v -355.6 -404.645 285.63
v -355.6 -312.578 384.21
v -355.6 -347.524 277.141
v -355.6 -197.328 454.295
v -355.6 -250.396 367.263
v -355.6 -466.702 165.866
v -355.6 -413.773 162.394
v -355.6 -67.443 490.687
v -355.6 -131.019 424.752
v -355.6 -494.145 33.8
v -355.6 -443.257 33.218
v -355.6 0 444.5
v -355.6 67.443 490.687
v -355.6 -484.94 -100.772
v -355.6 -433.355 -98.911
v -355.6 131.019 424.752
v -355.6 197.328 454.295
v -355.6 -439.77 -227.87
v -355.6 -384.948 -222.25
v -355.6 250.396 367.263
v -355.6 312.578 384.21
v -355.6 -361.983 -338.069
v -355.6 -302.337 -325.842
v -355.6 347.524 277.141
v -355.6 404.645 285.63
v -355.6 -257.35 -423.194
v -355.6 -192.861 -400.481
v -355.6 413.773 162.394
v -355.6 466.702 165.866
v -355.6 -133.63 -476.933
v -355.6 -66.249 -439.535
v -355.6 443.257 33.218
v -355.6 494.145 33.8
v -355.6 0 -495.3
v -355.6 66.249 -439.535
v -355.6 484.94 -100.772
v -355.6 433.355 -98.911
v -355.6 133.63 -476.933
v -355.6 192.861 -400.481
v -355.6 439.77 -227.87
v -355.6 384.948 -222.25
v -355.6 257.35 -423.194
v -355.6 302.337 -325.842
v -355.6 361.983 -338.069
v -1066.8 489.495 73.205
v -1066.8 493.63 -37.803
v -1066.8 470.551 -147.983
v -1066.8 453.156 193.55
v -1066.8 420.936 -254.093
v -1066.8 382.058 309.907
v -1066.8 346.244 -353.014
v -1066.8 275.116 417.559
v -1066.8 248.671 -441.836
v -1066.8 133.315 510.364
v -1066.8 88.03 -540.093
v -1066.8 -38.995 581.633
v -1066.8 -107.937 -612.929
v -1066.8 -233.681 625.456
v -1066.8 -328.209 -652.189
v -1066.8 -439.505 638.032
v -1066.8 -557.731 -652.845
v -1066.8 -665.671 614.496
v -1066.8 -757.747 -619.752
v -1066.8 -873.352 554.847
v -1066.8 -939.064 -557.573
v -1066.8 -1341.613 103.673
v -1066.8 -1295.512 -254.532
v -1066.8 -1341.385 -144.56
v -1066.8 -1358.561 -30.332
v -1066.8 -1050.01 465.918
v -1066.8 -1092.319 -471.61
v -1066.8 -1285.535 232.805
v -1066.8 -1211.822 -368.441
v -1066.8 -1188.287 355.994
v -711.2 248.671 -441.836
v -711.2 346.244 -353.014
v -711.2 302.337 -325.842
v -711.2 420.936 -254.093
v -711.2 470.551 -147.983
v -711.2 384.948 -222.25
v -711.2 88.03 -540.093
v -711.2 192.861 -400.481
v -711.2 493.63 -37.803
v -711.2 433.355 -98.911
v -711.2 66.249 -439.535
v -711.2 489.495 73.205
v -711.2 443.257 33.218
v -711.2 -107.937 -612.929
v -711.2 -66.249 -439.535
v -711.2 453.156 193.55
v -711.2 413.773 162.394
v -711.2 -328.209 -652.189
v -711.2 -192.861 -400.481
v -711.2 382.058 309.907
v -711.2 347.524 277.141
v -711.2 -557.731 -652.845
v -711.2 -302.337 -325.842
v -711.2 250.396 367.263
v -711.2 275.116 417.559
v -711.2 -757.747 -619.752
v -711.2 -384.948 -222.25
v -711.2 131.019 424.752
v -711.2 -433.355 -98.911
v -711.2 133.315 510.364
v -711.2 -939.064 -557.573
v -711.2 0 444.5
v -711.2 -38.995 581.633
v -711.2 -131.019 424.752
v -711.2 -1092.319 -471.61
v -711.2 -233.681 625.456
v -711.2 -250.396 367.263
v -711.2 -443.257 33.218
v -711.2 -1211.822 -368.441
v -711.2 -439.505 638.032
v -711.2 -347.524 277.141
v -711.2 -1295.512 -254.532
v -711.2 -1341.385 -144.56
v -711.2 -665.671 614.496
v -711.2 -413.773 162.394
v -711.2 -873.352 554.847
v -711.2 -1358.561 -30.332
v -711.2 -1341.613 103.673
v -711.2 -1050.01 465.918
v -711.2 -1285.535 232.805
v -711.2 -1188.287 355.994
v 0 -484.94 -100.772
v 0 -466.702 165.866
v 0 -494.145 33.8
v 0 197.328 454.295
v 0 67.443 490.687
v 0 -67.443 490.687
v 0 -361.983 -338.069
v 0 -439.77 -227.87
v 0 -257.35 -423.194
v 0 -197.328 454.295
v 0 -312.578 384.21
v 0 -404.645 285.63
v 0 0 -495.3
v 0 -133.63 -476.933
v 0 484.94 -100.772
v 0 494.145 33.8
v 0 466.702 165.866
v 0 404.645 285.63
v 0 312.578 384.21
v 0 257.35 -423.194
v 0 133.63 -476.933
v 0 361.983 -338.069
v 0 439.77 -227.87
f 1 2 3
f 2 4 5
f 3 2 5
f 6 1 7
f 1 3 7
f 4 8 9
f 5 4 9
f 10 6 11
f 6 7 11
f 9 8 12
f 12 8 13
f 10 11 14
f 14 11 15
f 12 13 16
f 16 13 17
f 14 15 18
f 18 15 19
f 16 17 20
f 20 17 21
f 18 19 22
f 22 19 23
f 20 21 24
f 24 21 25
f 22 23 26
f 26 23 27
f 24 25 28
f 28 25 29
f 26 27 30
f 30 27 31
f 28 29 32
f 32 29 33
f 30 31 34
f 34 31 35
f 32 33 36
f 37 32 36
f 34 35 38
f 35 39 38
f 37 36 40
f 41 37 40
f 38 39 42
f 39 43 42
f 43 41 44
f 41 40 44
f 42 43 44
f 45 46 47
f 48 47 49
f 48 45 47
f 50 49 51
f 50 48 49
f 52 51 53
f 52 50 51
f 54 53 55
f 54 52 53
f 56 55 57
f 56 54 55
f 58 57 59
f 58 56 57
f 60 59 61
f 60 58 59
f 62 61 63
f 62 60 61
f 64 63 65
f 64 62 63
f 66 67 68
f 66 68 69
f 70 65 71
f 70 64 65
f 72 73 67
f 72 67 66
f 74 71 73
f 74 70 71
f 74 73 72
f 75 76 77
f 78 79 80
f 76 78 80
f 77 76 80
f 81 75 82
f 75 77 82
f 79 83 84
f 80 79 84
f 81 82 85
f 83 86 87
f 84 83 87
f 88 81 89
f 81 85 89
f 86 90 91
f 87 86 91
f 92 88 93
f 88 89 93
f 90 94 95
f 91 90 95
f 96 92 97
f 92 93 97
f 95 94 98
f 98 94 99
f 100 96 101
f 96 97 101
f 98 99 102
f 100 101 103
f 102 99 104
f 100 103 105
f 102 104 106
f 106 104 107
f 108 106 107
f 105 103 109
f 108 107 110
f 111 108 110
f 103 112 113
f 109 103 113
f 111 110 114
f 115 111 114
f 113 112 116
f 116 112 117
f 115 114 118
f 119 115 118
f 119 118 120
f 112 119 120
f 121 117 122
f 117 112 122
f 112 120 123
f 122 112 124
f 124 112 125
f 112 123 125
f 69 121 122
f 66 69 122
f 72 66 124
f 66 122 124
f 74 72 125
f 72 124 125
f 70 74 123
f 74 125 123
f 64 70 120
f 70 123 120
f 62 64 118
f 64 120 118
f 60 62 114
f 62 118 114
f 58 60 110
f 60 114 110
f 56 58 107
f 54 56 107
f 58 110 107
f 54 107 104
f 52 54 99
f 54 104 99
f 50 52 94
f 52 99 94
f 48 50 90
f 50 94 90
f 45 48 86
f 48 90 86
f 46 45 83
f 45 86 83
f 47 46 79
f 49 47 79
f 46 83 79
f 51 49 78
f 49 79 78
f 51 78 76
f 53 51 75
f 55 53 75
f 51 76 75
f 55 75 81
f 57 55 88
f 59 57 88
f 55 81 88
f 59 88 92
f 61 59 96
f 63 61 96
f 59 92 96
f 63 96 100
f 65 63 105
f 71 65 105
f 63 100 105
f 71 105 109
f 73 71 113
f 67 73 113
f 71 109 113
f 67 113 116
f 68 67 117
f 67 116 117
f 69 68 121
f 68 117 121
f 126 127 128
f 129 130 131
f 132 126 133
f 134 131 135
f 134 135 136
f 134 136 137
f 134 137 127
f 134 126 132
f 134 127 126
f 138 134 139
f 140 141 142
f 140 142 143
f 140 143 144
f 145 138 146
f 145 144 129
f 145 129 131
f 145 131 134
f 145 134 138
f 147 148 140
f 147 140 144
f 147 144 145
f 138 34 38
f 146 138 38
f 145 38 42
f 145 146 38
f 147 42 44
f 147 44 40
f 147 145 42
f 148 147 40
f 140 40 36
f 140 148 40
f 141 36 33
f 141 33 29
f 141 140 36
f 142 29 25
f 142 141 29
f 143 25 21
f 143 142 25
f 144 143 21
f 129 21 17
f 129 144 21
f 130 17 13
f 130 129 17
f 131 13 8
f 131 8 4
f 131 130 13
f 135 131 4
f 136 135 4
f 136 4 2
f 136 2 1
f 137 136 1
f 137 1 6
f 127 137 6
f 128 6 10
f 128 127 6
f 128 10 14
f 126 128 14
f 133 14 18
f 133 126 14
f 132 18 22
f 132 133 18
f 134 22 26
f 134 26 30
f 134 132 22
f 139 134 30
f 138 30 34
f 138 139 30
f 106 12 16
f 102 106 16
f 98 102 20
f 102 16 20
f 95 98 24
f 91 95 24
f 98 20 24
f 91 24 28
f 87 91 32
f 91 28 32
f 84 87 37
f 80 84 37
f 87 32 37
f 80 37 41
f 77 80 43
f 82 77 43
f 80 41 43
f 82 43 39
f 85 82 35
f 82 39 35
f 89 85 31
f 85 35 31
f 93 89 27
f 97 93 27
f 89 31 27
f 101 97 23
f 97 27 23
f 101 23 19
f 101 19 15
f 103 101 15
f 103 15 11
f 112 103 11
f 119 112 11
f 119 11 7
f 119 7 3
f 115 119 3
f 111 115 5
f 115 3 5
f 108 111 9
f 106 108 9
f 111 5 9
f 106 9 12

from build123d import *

# Parameters (mm, degrees)
SKETCH1_R           = 495.3
BOSS_EXTRUDE1_DEPTH = 355.6
SKETCH2_R           = 444.5
BOSS_EXTRUDE2_DEPTH = 355.6
SKETCH3_RX          = 927.1
SKETCH3_RY          = 647.7
BOSS_EXTRUDE3_DEPTH = 355.6


with BuildPart() as part:
    # Sketch1 → Boss-Extrude1 (new body)
    with BuildSketch(Plane(origin=(0, 0, 0), x_dir=(0, 0, -1), z_dir=(1, 0, 0))):
        Circle(SKETCH1_R)
    extrude(amount=-BOSS_EXTRUDE1_DEPTH)

    # Sketch2 → Boss-Extrude2 (add)
    with BuildSketch(Plane.ZY.offset(355.6)):
        Circle(SKETCH2_R)
    extrude(amount=BOSS_EXTRUDE2_DEPTH)

    # Sketch3 → Boss-Extrude3 (add)
    with BuildSketch(Plane.ZY.offset(711.2)):
        with Locations(Location((-9.638351828, -431.692416165), (0, 0, -91.279024431))):
            Ellipse(SKETCH3_RX, SKETCH3_RY)
    extrude(amount=BOSS_EXTRUDE3_DEPTH)


solid = part.part
